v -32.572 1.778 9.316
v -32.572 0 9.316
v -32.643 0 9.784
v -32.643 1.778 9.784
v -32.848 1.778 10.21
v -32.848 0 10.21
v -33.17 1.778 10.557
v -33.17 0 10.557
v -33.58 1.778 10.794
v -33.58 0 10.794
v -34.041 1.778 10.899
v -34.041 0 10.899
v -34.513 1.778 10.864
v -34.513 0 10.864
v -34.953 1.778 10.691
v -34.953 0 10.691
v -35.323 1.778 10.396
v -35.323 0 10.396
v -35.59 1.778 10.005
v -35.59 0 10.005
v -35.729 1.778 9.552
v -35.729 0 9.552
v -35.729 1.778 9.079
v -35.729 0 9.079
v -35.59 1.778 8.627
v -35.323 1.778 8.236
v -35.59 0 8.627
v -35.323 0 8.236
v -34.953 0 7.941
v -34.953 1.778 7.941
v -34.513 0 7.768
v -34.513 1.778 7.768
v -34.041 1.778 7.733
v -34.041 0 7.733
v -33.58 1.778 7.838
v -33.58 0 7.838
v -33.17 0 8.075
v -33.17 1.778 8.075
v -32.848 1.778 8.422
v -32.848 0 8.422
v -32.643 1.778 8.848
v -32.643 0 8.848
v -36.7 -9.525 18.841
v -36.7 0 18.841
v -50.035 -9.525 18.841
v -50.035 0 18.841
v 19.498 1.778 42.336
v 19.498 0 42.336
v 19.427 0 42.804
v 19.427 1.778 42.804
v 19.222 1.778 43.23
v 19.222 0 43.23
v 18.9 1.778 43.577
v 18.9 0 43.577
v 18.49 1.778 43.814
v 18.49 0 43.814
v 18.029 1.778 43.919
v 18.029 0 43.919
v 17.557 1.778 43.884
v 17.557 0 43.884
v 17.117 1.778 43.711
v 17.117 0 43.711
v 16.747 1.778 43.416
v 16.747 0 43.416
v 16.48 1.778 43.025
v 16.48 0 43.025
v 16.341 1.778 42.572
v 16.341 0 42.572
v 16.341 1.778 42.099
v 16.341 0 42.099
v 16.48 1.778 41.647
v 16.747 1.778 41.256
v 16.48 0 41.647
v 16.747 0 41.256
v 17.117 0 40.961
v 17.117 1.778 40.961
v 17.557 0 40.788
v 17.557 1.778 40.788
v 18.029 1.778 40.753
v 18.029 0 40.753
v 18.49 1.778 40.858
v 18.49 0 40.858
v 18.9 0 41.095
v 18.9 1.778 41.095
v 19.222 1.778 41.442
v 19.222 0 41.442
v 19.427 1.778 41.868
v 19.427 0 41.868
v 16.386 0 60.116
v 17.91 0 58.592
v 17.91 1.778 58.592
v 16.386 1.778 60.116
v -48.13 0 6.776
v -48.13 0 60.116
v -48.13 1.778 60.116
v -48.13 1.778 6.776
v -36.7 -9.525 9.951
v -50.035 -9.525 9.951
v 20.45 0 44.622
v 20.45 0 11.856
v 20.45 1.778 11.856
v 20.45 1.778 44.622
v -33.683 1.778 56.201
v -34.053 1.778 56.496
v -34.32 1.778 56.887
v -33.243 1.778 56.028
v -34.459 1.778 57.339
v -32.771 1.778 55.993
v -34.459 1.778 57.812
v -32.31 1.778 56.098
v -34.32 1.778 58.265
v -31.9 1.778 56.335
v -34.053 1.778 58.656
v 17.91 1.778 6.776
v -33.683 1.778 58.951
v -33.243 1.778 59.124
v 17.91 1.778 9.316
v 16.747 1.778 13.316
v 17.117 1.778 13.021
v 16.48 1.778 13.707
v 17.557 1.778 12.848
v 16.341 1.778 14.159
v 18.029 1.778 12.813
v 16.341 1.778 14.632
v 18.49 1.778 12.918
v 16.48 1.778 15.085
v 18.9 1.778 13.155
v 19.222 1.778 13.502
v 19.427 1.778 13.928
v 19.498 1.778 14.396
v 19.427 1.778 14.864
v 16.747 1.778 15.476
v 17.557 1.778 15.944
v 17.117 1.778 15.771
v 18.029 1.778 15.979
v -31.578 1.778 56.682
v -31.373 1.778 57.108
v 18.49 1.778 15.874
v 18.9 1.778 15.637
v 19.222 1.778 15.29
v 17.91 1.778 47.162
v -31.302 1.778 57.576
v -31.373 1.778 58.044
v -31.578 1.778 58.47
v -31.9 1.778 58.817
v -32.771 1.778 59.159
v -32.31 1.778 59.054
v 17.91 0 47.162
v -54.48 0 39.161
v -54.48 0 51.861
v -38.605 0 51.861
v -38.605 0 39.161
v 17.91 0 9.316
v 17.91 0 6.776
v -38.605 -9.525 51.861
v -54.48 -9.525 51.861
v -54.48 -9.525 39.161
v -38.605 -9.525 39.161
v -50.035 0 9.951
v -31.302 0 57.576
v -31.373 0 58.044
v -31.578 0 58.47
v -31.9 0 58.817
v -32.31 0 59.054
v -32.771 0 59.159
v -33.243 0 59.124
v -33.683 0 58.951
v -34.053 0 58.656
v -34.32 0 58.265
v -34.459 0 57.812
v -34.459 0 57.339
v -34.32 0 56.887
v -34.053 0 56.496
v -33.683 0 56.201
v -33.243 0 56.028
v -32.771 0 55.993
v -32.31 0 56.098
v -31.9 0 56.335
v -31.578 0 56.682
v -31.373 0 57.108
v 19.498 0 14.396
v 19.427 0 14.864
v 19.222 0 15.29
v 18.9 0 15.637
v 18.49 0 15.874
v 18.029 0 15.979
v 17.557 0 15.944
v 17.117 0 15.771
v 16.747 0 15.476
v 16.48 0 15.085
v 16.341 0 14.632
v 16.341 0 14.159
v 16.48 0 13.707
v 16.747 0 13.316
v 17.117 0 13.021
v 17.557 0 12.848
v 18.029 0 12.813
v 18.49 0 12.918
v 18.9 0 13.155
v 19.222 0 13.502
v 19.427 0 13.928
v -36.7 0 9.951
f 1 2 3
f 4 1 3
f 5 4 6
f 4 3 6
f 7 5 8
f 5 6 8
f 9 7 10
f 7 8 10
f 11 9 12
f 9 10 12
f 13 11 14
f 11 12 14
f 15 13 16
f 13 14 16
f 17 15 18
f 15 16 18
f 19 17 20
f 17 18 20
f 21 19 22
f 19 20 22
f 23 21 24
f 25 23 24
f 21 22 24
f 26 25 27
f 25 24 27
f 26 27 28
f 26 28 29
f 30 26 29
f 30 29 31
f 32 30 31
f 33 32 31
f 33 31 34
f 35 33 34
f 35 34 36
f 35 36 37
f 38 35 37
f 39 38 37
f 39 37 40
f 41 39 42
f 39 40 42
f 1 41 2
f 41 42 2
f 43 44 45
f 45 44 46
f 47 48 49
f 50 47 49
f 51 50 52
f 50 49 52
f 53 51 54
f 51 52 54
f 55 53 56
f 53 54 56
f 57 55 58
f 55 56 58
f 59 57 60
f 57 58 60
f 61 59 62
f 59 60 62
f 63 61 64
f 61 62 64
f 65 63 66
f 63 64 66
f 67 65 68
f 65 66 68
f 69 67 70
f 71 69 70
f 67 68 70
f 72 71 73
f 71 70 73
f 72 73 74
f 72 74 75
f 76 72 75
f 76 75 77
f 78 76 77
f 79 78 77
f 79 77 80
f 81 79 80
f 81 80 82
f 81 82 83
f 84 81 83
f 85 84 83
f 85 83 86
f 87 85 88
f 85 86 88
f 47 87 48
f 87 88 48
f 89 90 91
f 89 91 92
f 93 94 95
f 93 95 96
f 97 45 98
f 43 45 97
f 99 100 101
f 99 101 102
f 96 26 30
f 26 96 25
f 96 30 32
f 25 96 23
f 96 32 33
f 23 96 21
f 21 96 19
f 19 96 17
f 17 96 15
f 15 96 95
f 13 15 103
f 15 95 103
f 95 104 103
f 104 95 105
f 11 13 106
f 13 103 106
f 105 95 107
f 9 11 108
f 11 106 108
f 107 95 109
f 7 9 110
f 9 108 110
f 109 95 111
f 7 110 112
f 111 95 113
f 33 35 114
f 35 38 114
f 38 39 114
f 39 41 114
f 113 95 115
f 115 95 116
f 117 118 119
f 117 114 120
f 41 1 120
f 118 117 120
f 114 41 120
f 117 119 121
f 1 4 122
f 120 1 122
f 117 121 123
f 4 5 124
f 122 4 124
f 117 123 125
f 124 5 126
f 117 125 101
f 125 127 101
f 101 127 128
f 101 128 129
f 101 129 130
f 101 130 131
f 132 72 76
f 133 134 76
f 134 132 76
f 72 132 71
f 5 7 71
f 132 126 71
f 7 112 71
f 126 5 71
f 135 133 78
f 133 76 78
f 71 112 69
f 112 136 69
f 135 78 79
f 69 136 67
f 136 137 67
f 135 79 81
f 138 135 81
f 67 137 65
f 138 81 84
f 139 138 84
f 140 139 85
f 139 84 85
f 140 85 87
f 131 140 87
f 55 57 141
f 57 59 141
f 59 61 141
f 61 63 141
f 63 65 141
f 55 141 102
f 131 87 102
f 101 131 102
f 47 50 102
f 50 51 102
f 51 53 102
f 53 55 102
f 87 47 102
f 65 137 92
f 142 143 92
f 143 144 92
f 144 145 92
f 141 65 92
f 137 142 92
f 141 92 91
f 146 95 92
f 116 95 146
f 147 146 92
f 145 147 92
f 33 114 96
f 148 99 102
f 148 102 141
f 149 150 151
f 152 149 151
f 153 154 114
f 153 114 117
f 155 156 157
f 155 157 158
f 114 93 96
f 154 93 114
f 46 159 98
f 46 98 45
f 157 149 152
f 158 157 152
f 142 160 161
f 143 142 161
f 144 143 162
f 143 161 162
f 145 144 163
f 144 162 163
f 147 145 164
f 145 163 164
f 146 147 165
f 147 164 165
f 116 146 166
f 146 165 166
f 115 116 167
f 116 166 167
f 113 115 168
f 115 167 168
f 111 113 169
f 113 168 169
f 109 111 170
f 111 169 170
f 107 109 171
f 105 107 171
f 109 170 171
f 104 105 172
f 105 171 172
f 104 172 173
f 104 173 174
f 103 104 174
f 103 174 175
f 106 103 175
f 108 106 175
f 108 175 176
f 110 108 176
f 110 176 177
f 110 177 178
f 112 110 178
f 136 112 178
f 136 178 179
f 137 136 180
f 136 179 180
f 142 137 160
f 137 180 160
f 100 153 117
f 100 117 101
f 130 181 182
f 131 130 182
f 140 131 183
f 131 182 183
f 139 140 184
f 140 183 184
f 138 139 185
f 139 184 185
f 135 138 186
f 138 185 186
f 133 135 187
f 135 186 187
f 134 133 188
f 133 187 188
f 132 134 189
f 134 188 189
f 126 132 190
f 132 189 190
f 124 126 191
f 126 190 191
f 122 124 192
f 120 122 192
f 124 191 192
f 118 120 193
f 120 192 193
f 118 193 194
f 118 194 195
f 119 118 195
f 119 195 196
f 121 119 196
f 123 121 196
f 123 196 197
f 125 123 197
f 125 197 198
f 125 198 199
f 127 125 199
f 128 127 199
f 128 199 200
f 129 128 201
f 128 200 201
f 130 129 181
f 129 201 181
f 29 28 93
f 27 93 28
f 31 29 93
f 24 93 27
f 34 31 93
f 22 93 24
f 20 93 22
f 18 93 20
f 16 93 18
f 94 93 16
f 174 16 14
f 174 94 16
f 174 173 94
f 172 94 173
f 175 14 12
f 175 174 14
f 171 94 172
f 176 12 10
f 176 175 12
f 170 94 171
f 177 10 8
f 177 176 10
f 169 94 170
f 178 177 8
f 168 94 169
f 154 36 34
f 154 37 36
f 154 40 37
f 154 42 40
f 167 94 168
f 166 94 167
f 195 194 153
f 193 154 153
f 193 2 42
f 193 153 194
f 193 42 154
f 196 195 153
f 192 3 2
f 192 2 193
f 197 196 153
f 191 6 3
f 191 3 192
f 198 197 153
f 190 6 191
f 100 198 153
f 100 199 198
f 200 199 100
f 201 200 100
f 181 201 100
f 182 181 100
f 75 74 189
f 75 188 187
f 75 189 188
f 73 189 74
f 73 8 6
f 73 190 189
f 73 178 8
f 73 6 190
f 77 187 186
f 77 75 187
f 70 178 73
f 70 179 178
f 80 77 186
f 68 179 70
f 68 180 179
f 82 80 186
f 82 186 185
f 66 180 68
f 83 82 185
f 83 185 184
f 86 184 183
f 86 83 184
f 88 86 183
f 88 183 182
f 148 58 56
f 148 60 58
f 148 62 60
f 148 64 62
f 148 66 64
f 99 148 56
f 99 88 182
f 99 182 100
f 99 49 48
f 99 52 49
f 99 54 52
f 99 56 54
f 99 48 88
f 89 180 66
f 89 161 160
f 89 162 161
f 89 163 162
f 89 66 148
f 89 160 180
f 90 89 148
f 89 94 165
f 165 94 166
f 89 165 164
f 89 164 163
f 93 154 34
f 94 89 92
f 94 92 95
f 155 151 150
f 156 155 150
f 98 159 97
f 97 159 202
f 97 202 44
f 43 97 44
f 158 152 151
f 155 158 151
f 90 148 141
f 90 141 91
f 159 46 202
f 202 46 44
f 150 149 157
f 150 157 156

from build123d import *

# Parameters (mm, degrees)
F0_R     = 1.5875
F2_DEPTH = 1.778
F1_W     = 6.35
F1_H     = 12.7
F1_W_2   = 9.525
F3_DEPTH = 9.525
F1_W_3   = 1.905
F1_H_2   = 8.89
F1_W_4   = 11.43


with BuildPart() as f2:
    # F0 (on Front) → F2 (new body)
    with BuildSketch(Plane.XZ):
        Polygon((16.3864672662, 60.1158626378), (-48.1295327338, 60.1158626378), (-48.1295327338, 6.7758626378), (17.9104672662, 6.7758626378), (17.9104672662, 9.3158626378), (20.4504672662, 11.8558626378), (20.4504672662, 44.6218626378), (17.9104672662, 47.1618626378), (17.9104672662, 58.5918626378), align=None)
        with Locations((-34.1595327338, 9.3158626378)):
            Circle(F0_R, mode=Mode.SUBTRACT)
        with Locations((17.9104672662, 14.3958626378)):
            Circle(F0_R, mode=Mode.SUBTRACT)
        with Locations((-32.8895327338, 57.5758626378)):
            Circle(F0_R, mode=Mode.SUBTRACT)
        with Locations((17.9104672662, 42.3358626378)):
            Circle(F0_R, mode=Mode.SUBTRACT)
    extrude(amount=-F2_DEPTH)


with BuildPart() as f3:
    # F1 (on face) → F3 (new body)
    with BuildSketch(Plane.XZ):
        with Locations((-51.3045327338, 45.5108626378)):
            Rectangle(F1_W, F1_H)
        with Locations((-43.3670327338, 45.5108626378)):
            Rectangle(F1_W_2, F1_H)
    extrude(amount=F3_DEPTH)


with BuildPart() as f3b:
    # F1 (on face) → F3, piece 2 (new body)
    with BuildSketch(Plane.XZ):
        with Locations((-49.0820327338, 14.3958626378)):
            Rectangle(F1_W_3, F1_H_2)
        with Locations((-42.4145327338, 14.3958626378)):
            Rectangle(F1_W_4, F1_H_2)
    extrude(amount=F3_DEPTH)


solid = Compound([f2.part, f3.part, f3b.part])
